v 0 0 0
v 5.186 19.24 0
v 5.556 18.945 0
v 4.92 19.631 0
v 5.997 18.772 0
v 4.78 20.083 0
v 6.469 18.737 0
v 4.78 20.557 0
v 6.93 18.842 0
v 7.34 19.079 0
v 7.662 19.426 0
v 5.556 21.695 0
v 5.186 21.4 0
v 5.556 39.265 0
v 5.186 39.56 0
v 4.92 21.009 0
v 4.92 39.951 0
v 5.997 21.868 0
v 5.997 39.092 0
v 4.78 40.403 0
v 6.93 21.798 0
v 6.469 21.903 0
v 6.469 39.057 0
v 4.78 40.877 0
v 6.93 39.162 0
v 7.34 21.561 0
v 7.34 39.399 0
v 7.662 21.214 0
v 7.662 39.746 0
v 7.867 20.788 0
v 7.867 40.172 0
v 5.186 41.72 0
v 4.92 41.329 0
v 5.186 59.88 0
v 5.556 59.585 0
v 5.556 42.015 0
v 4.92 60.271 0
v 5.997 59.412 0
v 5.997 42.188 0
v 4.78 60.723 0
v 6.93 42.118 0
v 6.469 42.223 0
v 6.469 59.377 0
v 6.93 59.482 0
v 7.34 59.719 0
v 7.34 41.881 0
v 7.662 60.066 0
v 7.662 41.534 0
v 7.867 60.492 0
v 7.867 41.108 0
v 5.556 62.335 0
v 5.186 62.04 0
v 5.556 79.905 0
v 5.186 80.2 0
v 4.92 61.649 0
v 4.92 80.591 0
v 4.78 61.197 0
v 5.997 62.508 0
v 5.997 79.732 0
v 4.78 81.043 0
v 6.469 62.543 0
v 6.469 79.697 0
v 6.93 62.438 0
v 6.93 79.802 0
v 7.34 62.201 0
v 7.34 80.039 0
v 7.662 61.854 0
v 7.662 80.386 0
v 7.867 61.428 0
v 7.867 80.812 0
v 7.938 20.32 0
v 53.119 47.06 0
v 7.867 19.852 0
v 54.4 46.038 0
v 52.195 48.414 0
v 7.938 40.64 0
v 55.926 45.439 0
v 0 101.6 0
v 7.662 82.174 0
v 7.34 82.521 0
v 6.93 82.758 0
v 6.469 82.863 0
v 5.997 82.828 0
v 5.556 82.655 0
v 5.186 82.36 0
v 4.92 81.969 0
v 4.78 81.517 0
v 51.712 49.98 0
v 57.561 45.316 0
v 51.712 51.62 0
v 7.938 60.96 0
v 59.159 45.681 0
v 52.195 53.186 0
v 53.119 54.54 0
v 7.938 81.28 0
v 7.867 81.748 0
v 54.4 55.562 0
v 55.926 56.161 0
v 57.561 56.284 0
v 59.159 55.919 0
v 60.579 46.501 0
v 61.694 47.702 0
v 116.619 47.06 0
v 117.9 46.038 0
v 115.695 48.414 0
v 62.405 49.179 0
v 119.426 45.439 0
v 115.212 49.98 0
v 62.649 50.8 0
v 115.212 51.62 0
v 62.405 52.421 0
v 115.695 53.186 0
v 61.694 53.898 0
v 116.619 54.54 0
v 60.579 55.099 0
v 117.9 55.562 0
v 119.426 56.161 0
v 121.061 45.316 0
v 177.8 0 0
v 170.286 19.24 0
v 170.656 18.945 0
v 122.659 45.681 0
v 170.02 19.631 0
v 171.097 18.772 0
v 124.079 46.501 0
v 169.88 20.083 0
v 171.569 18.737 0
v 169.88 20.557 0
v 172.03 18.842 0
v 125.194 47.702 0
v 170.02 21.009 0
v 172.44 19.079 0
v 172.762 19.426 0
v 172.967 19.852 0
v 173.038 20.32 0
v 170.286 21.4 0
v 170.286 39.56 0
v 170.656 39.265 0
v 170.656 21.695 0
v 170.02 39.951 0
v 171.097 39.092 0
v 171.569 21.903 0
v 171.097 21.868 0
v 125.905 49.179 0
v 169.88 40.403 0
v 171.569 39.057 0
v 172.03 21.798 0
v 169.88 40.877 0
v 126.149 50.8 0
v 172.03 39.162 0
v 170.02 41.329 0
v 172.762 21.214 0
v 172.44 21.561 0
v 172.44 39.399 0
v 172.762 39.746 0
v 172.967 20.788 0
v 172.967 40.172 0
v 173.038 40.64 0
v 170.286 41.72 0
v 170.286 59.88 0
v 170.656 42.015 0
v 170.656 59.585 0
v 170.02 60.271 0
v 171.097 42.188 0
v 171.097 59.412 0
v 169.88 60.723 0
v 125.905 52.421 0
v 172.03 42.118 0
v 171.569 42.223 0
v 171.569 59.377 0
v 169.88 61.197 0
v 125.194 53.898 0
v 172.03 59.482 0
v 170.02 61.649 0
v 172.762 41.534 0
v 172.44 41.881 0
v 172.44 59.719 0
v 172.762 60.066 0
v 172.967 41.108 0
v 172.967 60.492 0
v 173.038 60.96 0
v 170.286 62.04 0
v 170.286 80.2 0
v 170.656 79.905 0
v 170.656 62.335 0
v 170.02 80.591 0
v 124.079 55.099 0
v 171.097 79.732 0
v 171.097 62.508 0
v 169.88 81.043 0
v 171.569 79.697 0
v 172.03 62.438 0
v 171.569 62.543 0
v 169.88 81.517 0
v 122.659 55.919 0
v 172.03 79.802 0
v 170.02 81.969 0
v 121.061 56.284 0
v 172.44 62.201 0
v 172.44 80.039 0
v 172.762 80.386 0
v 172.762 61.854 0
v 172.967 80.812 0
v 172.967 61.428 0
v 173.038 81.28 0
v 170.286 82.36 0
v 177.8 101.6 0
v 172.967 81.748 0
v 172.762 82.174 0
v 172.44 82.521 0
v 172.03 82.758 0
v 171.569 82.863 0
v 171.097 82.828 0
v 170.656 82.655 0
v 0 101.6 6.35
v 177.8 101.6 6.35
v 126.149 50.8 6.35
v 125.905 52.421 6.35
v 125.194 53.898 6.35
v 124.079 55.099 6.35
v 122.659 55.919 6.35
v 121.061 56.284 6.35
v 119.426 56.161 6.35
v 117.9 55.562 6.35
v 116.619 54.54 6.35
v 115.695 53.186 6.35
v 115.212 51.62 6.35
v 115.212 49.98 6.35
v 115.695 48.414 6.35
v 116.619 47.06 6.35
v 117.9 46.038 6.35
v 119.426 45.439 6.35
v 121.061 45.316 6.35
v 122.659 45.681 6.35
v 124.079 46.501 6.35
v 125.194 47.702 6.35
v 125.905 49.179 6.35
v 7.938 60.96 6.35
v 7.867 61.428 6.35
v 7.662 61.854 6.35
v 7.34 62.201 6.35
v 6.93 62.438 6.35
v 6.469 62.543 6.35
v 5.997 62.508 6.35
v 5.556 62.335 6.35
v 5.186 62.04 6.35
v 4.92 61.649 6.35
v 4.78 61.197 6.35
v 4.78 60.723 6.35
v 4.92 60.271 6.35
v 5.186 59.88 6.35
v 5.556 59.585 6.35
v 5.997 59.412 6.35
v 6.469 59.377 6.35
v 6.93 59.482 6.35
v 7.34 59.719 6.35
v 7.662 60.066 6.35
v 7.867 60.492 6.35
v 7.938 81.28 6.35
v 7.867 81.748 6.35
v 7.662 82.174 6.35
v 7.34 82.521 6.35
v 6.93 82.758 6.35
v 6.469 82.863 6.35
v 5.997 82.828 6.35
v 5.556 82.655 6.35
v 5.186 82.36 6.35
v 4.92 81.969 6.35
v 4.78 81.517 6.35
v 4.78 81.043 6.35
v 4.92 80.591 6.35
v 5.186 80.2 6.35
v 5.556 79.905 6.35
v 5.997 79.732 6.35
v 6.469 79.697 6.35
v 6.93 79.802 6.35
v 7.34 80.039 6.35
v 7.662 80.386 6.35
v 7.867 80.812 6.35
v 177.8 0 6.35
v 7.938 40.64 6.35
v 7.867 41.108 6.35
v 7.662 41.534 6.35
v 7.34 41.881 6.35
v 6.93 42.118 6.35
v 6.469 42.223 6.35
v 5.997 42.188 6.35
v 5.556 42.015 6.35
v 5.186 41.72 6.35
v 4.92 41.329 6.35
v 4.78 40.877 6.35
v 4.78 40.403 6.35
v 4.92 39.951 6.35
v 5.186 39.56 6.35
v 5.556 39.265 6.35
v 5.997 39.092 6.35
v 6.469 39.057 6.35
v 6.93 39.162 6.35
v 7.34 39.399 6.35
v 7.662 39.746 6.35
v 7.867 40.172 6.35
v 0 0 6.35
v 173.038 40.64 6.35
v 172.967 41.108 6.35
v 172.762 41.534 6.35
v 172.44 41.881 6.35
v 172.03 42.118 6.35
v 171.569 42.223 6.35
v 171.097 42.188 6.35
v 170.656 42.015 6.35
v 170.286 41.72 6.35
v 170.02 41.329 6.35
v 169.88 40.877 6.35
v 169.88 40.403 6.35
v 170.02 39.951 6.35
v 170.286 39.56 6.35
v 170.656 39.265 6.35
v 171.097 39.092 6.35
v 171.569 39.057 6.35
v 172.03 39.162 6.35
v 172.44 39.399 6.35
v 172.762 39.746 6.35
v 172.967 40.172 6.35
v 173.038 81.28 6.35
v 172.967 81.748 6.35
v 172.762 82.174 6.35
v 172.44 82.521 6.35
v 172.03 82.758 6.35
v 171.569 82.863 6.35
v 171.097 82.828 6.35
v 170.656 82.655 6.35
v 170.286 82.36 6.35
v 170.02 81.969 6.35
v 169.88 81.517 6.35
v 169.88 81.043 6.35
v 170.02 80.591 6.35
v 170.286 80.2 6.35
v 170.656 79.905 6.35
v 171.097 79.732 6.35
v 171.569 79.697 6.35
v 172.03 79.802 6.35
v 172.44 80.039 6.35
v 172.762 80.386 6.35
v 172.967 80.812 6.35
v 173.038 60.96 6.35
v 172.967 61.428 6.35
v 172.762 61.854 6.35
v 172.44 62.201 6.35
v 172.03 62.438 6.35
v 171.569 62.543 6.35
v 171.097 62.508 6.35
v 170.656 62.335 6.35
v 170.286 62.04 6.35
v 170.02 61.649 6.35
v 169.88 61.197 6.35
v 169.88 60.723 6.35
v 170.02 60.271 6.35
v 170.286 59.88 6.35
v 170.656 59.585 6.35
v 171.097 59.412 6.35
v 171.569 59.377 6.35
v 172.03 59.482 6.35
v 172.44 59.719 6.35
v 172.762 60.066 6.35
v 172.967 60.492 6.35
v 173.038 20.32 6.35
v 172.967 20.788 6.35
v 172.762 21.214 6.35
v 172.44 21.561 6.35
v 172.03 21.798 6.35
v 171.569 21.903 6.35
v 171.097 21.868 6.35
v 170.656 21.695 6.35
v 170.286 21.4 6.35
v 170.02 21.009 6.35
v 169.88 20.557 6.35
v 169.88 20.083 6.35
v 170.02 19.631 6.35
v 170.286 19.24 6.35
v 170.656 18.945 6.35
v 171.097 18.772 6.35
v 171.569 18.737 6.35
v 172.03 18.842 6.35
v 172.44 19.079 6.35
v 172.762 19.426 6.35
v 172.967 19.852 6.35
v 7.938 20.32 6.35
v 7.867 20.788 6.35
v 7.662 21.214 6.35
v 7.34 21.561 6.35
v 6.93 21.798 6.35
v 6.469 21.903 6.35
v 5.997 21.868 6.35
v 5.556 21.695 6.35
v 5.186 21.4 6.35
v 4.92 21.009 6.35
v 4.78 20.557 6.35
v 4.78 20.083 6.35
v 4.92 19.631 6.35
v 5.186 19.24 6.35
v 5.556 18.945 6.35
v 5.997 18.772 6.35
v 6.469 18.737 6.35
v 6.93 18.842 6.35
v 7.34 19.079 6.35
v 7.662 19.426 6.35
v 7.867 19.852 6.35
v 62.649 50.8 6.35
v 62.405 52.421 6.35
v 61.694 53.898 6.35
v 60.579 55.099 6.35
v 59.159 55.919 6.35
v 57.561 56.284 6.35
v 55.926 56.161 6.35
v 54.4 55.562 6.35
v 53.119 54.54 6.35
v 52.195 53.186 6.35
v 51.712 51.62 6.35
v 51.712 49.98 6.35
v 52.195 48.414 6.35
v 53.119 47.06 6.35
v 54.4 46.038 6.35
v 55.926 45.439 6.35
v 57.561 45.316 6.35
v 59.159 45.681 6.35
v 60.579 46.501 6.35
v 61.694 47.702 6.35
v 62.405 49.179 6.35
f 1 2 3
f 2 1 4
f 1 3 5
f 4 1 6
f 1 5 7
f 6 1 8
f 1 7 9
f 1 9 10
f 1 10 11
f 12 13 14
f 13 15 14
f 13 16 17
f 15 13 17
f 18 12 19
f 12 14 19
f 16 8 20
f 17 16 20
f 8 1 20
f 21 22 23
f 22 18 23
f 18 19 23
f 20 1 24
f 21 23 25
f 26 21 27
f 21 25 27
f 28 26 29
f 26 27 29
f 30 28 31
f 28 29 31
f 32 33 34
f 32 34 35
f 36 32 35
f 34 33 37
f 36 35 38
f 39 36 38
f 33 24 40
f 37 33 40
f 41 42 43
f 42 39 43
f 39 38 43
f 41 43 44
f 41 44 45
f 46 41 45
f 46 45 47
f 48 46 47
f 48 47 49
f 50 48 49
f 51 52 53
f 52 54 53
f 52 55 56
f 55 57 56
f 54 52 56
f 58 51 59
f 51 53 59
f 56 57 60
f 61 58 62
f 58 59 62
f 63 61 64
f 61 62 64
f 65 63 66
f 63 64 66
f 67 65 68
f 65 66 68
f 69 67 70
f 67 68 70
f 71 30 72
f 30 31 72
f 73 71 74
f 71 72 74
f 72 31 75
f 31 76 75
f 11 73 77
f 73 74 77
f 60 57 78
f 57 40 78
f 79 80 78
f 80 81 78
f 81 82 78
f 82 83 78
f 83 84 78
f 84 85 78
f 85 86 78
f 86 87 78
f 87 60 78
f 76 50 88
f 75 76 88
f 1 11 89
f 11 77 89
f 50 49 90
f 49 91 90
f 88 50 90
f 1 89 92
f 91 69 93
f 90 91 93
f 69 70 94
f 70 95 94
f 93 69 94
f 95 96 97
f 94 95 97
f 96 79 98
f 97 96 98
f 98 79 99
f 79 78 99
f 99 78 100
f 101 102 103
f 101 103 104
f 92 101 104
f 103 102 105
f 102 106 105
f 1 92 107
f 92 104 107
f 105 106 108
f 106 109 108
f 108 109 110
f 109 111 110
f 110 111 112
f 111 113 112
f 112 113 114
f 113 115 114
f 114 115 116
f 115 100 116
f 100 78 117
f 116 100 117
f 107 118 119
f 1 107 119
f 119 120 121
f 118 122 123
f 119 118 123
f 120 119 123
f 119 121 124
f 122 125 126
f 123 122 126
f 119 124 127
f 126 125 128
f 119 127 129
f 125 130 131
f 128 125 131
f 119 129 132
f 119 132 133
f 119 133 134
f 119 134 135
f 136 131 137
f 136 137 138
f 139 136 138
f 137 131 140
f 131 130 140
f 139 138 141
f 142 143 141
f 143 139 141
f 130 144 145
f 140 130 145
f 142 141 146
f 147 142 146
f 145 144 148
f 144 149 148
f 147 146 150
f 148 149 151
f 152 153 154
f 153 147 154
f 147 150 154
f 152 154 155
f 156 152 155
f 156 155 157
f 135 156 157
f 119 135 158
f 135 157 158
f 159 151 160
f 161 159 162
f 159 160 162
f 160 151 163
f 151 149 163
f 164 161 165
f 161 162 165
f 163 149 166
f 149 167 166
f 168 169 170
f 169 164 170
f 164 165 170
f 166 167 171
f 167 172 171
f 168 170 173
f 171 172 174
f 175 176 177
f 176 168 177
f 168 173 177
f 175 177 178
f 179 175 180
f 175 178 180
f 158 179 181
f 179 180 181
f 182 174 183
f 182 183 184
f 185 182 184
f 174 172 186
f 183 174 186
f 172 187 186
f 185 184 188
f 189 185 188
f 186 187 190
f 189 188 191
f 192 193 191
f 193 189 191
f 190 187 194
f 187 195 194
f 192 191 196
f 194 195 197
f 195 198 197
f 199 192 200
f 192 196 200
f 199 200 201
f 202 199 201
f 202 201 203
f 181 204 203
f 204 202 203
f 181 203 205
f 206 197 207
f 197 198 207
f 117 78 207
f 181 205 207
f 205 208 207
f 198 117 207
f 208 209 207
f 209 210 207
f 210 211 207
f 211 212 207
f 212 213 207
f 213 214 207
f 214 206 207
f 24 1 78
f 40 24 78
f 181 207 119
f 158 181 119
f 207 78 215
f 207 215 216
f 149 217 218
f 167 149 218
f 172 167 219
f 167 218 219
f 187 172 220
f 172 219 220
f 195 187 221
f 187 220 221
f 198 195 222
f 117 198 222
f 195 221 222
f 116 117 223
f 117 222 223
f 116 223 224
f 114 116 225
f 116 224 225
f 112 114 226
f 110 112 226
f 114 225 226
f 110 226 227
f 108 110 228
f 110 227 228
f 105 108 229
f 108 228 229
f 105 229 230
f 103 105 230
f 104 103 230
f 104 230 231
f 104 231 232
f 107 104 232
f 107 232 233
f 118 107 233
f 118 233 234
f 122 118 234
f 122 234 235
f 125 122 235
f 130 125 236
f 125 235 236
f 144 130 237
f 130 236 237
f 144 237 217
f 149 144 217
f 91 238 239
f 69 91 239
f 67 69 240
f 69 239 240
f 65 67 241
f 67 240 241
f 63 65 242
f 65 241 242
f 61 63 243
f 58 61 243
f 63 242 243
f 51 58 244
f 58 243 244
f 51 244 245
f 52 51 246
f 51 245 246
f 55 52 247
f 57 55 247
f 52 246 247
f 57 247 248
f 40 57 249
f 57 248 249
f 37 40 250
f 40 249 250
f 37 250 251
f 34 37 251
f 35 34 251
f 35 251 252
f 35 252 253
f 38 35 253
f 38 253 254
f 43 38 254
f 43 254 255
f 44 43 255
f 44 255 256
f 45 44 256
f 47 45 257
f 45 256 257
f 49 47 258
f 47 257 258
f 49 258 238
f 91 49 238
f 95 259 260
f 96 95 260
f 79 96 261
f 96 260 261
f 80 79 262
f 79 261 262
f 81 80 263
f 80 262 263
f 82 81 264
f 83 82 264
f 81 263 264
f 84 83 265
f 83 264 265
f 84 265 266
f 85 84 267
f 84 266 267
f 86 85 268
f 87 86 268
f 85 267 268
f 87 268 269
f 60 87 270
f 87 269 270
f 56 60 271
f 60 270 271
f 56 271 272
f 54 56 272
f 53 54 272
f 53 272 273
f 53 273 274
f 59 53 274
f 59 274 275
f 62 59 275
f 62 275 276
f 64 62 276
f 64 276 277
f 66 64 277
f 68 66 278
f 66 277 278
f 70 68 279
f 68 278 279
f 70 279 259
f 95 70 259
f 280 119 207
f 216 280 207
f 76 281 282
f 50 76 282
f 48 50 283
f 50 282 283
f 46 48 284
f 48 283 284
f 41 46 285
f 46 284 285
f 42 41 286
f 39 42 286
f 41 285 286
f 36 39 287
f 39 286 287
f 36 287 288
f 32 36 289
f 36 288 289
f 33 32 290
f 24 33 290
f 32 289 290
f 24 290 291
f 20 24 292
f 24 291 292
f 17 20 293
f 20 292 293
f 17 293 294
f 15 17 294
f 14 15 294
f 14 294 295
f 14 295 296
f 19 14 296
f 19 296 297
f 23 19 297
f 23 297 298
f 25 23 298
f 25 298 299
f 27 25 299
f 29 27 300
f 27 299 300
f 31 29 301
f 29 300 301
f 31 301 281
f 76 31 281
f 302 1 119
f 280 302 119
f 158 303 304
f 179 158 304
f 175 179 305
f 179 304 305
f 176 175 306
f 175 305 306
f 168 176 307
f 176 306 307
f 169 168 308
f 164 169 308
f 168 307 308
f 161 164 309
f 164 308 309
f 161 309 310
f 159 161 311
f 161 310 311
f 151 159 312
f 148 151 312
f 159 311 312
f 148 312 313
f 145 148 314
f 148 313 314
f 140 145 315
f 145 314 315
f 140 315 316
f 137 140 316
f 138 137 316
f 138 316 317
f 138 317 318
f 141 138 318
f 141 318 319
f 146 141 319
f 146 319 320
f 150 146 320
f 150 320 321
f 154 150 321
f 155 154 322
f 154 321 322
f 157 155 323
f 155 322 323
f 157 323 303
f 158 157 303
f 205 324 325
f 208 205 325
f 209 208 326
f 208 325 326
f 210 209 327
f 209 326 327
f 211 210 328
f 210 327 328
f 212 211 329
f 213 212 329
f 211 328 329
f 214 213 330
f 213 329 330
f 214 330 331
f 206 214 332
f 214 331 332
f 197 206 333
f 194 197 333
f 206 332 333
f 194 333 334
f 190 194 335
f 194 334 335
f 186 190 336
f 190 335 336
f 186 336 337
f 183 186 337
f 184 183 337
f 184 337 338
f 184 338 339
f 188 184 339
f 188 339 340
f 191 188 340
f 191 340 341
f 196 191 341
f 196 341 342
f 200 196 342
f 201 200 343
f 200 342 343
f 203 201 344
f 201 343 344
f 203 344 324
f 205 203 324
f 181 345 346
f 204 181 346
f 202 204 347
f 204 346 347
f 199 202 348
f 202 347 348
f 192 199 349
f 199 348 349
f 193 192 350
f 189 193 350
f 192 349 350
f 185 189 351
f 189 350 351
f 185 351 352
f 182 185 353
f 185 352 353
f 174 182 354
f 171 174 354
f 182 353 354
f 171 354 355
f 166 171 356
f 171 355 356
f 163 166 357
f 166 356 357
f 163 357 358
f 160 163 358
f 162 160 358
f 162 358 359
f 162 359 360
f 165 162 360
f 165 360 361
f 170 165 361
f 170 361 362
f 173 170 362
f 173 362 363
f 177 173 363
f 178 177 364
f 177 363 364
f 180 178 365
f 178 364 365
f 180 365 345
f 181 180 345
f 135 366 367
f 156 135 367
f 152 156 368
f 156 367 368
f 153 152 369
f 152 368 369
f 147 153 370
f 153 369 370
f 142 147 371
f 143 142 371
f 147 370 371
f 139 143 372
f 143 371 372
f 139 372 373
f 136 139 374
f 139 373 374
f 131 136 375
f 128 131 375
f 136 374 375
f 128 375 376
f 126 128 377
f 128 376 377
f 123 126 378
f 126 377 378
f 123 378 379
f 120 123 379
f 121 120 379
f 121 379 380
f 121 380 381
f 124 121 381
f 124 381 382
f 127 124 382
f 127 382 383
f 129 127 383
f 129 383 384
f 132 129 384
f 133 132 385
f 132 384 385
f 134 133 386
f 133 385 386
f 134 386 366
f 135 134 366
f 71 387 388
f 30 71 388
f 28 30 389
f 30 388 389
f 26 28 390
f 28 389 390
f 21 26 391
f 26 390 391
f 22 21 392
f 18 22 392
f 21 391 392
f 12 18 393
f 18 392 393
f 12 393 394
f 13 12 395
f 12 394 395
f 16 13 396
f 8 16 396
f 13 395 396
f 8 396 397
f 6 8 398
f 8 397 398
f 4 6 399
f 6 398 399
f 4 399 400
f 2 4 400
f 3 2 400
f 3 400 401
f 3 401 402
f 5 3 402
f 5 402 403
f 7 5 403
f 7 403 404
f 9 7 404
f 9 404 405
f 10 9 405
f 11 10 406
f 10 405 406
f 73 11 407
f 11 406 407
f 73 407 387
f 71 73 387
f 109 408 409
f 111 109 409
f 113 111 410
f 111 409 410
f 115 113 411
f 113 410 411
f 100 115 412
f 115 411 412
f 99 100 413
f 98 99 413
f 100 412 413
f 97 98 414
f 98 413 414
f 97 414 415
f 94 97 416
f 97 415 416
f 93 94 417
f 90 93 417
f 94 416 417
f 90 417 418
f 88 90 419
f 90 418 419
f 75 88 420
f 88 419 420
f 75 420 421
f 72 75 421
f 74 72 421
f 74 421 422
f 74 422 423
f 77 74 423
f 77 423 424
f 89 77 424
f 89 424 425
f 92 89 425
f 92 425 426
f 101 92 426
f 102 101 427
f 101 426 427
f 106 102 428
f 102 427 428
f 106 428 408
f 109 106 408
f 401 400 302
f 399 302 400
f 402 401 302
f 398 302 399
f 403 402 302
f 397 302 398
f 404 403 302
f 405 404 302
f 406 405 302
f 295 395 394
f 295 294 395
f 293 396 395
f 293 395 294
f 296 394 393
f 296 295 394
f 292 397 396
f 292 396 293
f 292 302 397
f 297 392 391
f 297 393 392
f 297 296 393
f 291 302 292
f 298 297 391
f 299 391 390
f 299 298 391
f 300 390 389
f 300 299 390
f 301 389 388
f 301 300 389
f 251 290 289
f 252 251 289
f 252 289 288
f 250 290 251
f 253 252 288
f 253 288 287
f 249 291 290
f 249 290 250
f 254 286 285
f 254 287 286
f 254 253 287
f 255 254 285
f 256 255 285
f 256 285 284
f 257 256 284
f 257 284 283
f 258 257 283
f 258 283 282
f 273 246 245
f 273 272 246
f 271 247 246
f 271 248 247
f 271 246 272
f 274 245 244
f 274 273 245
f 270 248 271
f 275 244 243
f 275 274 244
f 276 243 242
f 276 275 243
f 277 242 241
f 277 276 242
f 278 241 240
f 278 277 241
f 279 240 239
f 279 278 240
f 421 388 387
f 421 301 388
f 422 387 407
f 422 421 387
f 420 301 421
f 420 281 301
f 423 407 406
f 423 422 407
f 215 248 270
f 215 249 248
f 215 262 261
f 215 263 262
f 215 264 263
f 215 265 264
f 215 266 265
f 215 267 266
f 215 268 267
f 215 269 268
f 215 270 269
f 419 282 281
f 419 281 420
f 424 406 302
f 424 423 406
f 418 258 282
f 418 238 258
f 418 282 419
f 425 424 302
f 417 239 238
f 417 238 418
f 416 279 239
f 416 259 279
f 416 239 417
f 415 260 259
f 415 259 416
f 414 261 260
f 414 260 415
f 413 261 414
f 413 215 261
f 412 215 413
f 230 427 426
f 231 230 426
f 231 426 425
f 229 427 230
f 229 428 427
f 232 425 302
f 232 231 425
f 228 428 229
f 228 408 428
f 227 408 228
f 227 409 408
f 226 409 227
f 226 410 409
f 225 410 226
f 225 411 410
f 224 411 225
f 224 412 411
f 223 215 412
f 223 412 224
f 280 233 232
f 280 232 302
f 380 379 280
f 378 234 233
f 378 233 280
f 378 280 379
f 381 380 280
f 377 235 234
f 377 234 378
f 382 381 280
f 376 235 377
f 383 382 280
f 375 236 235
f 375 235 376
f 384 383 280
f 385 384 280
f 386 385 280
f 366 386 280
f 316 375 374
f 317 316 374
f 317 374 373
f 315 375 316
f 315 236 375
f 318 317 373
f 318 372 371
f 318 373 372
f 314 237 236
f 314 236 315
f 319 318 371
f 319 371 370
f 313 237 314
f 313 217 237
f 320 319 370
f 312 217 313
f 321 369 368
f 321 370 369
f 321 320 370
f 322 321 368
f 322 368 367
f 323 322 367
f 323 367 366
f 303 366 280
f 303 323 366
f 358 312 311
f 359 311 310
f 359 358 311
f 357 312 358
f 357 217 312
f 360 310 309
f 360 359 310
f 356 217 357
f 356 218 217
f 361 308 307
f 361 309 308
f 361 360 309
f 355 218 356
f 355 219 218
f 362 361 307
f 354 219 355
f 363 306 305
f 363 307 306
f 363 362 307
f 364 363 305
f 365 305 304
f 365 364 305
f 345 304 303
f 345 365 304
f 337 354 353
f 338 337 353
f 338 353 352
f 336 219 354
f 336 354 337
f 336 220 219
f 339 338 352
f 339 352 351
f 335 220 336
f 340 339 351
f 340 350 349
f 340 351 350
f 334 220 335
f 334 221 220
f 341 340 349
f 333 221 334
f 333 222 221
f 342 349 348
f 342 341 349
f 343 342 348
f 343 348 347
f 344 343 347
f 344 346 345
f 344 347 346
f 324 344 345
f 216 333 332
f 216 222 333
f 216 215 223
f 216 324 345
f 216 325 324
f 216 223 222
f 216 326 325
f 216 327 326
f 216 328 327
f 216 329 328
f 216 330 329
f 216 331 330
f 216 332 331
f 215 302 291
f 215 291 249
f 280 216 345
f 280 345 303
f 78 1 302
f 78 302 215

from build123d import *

# Parameters (mm, degrees)
SKETCH1_W           = 177.8
SKETCH1_H           = 101.6
BOSS_EXTRUDE1_DEPTH = 6.35
SKETCH2_R           = 1.5875
CUT_EXTRUDE1_DEPTH  = 6.35
SKETCH5_R           = 5.499261314
CUT_EXTRUDE3_DEPTH  = 6.35


with BuildPart() as part:
    # Sketch1 → Boss-Extrude1 (new body)
    with BuildSketch(Plane.XY):
        with Locations((88.9, 50.8)):
            Rectangle(SKETCH1_W, SKETCH1_H)
    extrude(amount=BOSS_EXTRUDE1_DEPTH)

    # Sketch2 → Cut-Extrude1 (cut)
    with BuildSketch(Plane.XY.offset(6.35)):
        with Locations((6.35, 81.28)):
            Circle(SKETCH2_R)
        with Locations((6.35, 60.96)):
            Circle(SKETCH2_R)
        with Locations((6.35, 40.64)):
            Circle(SKETCH2_R)
        with Locations((6.35, 20.32)):
            Circle(SKETCH2_R)
        with Locations((171.45, 20.32)):
            Circle(SKETCH2_R)
        with Locations((171.45, 40.64)):
            Circle(SKETCH2_R)
        with Locations((171.45, 60.96)):
            Circle(SKETCH2_R)
        with Locations((171.45, 81.28)):
            Circle(SKETCH2_R)
    extrude(amount=-CUT_EXTRUDE1_DEPTH, mode=Mode.SUBTRACT)

    # Sketch5 → Cut-Extrude3 (cut)
    with BuildSketch(Plane.XY.offset(6.35)):
        with Locations((120.65, 50.8)):
            Circle(SKETCH5_R)
        with Locations((57.15, 50.8)):
            Circle(SKETCH5_R)
    extrude(amount=-CUT_EXTRUDE3_DEPTH, mode=Mode.SUBTRACT)


solid = part.part
